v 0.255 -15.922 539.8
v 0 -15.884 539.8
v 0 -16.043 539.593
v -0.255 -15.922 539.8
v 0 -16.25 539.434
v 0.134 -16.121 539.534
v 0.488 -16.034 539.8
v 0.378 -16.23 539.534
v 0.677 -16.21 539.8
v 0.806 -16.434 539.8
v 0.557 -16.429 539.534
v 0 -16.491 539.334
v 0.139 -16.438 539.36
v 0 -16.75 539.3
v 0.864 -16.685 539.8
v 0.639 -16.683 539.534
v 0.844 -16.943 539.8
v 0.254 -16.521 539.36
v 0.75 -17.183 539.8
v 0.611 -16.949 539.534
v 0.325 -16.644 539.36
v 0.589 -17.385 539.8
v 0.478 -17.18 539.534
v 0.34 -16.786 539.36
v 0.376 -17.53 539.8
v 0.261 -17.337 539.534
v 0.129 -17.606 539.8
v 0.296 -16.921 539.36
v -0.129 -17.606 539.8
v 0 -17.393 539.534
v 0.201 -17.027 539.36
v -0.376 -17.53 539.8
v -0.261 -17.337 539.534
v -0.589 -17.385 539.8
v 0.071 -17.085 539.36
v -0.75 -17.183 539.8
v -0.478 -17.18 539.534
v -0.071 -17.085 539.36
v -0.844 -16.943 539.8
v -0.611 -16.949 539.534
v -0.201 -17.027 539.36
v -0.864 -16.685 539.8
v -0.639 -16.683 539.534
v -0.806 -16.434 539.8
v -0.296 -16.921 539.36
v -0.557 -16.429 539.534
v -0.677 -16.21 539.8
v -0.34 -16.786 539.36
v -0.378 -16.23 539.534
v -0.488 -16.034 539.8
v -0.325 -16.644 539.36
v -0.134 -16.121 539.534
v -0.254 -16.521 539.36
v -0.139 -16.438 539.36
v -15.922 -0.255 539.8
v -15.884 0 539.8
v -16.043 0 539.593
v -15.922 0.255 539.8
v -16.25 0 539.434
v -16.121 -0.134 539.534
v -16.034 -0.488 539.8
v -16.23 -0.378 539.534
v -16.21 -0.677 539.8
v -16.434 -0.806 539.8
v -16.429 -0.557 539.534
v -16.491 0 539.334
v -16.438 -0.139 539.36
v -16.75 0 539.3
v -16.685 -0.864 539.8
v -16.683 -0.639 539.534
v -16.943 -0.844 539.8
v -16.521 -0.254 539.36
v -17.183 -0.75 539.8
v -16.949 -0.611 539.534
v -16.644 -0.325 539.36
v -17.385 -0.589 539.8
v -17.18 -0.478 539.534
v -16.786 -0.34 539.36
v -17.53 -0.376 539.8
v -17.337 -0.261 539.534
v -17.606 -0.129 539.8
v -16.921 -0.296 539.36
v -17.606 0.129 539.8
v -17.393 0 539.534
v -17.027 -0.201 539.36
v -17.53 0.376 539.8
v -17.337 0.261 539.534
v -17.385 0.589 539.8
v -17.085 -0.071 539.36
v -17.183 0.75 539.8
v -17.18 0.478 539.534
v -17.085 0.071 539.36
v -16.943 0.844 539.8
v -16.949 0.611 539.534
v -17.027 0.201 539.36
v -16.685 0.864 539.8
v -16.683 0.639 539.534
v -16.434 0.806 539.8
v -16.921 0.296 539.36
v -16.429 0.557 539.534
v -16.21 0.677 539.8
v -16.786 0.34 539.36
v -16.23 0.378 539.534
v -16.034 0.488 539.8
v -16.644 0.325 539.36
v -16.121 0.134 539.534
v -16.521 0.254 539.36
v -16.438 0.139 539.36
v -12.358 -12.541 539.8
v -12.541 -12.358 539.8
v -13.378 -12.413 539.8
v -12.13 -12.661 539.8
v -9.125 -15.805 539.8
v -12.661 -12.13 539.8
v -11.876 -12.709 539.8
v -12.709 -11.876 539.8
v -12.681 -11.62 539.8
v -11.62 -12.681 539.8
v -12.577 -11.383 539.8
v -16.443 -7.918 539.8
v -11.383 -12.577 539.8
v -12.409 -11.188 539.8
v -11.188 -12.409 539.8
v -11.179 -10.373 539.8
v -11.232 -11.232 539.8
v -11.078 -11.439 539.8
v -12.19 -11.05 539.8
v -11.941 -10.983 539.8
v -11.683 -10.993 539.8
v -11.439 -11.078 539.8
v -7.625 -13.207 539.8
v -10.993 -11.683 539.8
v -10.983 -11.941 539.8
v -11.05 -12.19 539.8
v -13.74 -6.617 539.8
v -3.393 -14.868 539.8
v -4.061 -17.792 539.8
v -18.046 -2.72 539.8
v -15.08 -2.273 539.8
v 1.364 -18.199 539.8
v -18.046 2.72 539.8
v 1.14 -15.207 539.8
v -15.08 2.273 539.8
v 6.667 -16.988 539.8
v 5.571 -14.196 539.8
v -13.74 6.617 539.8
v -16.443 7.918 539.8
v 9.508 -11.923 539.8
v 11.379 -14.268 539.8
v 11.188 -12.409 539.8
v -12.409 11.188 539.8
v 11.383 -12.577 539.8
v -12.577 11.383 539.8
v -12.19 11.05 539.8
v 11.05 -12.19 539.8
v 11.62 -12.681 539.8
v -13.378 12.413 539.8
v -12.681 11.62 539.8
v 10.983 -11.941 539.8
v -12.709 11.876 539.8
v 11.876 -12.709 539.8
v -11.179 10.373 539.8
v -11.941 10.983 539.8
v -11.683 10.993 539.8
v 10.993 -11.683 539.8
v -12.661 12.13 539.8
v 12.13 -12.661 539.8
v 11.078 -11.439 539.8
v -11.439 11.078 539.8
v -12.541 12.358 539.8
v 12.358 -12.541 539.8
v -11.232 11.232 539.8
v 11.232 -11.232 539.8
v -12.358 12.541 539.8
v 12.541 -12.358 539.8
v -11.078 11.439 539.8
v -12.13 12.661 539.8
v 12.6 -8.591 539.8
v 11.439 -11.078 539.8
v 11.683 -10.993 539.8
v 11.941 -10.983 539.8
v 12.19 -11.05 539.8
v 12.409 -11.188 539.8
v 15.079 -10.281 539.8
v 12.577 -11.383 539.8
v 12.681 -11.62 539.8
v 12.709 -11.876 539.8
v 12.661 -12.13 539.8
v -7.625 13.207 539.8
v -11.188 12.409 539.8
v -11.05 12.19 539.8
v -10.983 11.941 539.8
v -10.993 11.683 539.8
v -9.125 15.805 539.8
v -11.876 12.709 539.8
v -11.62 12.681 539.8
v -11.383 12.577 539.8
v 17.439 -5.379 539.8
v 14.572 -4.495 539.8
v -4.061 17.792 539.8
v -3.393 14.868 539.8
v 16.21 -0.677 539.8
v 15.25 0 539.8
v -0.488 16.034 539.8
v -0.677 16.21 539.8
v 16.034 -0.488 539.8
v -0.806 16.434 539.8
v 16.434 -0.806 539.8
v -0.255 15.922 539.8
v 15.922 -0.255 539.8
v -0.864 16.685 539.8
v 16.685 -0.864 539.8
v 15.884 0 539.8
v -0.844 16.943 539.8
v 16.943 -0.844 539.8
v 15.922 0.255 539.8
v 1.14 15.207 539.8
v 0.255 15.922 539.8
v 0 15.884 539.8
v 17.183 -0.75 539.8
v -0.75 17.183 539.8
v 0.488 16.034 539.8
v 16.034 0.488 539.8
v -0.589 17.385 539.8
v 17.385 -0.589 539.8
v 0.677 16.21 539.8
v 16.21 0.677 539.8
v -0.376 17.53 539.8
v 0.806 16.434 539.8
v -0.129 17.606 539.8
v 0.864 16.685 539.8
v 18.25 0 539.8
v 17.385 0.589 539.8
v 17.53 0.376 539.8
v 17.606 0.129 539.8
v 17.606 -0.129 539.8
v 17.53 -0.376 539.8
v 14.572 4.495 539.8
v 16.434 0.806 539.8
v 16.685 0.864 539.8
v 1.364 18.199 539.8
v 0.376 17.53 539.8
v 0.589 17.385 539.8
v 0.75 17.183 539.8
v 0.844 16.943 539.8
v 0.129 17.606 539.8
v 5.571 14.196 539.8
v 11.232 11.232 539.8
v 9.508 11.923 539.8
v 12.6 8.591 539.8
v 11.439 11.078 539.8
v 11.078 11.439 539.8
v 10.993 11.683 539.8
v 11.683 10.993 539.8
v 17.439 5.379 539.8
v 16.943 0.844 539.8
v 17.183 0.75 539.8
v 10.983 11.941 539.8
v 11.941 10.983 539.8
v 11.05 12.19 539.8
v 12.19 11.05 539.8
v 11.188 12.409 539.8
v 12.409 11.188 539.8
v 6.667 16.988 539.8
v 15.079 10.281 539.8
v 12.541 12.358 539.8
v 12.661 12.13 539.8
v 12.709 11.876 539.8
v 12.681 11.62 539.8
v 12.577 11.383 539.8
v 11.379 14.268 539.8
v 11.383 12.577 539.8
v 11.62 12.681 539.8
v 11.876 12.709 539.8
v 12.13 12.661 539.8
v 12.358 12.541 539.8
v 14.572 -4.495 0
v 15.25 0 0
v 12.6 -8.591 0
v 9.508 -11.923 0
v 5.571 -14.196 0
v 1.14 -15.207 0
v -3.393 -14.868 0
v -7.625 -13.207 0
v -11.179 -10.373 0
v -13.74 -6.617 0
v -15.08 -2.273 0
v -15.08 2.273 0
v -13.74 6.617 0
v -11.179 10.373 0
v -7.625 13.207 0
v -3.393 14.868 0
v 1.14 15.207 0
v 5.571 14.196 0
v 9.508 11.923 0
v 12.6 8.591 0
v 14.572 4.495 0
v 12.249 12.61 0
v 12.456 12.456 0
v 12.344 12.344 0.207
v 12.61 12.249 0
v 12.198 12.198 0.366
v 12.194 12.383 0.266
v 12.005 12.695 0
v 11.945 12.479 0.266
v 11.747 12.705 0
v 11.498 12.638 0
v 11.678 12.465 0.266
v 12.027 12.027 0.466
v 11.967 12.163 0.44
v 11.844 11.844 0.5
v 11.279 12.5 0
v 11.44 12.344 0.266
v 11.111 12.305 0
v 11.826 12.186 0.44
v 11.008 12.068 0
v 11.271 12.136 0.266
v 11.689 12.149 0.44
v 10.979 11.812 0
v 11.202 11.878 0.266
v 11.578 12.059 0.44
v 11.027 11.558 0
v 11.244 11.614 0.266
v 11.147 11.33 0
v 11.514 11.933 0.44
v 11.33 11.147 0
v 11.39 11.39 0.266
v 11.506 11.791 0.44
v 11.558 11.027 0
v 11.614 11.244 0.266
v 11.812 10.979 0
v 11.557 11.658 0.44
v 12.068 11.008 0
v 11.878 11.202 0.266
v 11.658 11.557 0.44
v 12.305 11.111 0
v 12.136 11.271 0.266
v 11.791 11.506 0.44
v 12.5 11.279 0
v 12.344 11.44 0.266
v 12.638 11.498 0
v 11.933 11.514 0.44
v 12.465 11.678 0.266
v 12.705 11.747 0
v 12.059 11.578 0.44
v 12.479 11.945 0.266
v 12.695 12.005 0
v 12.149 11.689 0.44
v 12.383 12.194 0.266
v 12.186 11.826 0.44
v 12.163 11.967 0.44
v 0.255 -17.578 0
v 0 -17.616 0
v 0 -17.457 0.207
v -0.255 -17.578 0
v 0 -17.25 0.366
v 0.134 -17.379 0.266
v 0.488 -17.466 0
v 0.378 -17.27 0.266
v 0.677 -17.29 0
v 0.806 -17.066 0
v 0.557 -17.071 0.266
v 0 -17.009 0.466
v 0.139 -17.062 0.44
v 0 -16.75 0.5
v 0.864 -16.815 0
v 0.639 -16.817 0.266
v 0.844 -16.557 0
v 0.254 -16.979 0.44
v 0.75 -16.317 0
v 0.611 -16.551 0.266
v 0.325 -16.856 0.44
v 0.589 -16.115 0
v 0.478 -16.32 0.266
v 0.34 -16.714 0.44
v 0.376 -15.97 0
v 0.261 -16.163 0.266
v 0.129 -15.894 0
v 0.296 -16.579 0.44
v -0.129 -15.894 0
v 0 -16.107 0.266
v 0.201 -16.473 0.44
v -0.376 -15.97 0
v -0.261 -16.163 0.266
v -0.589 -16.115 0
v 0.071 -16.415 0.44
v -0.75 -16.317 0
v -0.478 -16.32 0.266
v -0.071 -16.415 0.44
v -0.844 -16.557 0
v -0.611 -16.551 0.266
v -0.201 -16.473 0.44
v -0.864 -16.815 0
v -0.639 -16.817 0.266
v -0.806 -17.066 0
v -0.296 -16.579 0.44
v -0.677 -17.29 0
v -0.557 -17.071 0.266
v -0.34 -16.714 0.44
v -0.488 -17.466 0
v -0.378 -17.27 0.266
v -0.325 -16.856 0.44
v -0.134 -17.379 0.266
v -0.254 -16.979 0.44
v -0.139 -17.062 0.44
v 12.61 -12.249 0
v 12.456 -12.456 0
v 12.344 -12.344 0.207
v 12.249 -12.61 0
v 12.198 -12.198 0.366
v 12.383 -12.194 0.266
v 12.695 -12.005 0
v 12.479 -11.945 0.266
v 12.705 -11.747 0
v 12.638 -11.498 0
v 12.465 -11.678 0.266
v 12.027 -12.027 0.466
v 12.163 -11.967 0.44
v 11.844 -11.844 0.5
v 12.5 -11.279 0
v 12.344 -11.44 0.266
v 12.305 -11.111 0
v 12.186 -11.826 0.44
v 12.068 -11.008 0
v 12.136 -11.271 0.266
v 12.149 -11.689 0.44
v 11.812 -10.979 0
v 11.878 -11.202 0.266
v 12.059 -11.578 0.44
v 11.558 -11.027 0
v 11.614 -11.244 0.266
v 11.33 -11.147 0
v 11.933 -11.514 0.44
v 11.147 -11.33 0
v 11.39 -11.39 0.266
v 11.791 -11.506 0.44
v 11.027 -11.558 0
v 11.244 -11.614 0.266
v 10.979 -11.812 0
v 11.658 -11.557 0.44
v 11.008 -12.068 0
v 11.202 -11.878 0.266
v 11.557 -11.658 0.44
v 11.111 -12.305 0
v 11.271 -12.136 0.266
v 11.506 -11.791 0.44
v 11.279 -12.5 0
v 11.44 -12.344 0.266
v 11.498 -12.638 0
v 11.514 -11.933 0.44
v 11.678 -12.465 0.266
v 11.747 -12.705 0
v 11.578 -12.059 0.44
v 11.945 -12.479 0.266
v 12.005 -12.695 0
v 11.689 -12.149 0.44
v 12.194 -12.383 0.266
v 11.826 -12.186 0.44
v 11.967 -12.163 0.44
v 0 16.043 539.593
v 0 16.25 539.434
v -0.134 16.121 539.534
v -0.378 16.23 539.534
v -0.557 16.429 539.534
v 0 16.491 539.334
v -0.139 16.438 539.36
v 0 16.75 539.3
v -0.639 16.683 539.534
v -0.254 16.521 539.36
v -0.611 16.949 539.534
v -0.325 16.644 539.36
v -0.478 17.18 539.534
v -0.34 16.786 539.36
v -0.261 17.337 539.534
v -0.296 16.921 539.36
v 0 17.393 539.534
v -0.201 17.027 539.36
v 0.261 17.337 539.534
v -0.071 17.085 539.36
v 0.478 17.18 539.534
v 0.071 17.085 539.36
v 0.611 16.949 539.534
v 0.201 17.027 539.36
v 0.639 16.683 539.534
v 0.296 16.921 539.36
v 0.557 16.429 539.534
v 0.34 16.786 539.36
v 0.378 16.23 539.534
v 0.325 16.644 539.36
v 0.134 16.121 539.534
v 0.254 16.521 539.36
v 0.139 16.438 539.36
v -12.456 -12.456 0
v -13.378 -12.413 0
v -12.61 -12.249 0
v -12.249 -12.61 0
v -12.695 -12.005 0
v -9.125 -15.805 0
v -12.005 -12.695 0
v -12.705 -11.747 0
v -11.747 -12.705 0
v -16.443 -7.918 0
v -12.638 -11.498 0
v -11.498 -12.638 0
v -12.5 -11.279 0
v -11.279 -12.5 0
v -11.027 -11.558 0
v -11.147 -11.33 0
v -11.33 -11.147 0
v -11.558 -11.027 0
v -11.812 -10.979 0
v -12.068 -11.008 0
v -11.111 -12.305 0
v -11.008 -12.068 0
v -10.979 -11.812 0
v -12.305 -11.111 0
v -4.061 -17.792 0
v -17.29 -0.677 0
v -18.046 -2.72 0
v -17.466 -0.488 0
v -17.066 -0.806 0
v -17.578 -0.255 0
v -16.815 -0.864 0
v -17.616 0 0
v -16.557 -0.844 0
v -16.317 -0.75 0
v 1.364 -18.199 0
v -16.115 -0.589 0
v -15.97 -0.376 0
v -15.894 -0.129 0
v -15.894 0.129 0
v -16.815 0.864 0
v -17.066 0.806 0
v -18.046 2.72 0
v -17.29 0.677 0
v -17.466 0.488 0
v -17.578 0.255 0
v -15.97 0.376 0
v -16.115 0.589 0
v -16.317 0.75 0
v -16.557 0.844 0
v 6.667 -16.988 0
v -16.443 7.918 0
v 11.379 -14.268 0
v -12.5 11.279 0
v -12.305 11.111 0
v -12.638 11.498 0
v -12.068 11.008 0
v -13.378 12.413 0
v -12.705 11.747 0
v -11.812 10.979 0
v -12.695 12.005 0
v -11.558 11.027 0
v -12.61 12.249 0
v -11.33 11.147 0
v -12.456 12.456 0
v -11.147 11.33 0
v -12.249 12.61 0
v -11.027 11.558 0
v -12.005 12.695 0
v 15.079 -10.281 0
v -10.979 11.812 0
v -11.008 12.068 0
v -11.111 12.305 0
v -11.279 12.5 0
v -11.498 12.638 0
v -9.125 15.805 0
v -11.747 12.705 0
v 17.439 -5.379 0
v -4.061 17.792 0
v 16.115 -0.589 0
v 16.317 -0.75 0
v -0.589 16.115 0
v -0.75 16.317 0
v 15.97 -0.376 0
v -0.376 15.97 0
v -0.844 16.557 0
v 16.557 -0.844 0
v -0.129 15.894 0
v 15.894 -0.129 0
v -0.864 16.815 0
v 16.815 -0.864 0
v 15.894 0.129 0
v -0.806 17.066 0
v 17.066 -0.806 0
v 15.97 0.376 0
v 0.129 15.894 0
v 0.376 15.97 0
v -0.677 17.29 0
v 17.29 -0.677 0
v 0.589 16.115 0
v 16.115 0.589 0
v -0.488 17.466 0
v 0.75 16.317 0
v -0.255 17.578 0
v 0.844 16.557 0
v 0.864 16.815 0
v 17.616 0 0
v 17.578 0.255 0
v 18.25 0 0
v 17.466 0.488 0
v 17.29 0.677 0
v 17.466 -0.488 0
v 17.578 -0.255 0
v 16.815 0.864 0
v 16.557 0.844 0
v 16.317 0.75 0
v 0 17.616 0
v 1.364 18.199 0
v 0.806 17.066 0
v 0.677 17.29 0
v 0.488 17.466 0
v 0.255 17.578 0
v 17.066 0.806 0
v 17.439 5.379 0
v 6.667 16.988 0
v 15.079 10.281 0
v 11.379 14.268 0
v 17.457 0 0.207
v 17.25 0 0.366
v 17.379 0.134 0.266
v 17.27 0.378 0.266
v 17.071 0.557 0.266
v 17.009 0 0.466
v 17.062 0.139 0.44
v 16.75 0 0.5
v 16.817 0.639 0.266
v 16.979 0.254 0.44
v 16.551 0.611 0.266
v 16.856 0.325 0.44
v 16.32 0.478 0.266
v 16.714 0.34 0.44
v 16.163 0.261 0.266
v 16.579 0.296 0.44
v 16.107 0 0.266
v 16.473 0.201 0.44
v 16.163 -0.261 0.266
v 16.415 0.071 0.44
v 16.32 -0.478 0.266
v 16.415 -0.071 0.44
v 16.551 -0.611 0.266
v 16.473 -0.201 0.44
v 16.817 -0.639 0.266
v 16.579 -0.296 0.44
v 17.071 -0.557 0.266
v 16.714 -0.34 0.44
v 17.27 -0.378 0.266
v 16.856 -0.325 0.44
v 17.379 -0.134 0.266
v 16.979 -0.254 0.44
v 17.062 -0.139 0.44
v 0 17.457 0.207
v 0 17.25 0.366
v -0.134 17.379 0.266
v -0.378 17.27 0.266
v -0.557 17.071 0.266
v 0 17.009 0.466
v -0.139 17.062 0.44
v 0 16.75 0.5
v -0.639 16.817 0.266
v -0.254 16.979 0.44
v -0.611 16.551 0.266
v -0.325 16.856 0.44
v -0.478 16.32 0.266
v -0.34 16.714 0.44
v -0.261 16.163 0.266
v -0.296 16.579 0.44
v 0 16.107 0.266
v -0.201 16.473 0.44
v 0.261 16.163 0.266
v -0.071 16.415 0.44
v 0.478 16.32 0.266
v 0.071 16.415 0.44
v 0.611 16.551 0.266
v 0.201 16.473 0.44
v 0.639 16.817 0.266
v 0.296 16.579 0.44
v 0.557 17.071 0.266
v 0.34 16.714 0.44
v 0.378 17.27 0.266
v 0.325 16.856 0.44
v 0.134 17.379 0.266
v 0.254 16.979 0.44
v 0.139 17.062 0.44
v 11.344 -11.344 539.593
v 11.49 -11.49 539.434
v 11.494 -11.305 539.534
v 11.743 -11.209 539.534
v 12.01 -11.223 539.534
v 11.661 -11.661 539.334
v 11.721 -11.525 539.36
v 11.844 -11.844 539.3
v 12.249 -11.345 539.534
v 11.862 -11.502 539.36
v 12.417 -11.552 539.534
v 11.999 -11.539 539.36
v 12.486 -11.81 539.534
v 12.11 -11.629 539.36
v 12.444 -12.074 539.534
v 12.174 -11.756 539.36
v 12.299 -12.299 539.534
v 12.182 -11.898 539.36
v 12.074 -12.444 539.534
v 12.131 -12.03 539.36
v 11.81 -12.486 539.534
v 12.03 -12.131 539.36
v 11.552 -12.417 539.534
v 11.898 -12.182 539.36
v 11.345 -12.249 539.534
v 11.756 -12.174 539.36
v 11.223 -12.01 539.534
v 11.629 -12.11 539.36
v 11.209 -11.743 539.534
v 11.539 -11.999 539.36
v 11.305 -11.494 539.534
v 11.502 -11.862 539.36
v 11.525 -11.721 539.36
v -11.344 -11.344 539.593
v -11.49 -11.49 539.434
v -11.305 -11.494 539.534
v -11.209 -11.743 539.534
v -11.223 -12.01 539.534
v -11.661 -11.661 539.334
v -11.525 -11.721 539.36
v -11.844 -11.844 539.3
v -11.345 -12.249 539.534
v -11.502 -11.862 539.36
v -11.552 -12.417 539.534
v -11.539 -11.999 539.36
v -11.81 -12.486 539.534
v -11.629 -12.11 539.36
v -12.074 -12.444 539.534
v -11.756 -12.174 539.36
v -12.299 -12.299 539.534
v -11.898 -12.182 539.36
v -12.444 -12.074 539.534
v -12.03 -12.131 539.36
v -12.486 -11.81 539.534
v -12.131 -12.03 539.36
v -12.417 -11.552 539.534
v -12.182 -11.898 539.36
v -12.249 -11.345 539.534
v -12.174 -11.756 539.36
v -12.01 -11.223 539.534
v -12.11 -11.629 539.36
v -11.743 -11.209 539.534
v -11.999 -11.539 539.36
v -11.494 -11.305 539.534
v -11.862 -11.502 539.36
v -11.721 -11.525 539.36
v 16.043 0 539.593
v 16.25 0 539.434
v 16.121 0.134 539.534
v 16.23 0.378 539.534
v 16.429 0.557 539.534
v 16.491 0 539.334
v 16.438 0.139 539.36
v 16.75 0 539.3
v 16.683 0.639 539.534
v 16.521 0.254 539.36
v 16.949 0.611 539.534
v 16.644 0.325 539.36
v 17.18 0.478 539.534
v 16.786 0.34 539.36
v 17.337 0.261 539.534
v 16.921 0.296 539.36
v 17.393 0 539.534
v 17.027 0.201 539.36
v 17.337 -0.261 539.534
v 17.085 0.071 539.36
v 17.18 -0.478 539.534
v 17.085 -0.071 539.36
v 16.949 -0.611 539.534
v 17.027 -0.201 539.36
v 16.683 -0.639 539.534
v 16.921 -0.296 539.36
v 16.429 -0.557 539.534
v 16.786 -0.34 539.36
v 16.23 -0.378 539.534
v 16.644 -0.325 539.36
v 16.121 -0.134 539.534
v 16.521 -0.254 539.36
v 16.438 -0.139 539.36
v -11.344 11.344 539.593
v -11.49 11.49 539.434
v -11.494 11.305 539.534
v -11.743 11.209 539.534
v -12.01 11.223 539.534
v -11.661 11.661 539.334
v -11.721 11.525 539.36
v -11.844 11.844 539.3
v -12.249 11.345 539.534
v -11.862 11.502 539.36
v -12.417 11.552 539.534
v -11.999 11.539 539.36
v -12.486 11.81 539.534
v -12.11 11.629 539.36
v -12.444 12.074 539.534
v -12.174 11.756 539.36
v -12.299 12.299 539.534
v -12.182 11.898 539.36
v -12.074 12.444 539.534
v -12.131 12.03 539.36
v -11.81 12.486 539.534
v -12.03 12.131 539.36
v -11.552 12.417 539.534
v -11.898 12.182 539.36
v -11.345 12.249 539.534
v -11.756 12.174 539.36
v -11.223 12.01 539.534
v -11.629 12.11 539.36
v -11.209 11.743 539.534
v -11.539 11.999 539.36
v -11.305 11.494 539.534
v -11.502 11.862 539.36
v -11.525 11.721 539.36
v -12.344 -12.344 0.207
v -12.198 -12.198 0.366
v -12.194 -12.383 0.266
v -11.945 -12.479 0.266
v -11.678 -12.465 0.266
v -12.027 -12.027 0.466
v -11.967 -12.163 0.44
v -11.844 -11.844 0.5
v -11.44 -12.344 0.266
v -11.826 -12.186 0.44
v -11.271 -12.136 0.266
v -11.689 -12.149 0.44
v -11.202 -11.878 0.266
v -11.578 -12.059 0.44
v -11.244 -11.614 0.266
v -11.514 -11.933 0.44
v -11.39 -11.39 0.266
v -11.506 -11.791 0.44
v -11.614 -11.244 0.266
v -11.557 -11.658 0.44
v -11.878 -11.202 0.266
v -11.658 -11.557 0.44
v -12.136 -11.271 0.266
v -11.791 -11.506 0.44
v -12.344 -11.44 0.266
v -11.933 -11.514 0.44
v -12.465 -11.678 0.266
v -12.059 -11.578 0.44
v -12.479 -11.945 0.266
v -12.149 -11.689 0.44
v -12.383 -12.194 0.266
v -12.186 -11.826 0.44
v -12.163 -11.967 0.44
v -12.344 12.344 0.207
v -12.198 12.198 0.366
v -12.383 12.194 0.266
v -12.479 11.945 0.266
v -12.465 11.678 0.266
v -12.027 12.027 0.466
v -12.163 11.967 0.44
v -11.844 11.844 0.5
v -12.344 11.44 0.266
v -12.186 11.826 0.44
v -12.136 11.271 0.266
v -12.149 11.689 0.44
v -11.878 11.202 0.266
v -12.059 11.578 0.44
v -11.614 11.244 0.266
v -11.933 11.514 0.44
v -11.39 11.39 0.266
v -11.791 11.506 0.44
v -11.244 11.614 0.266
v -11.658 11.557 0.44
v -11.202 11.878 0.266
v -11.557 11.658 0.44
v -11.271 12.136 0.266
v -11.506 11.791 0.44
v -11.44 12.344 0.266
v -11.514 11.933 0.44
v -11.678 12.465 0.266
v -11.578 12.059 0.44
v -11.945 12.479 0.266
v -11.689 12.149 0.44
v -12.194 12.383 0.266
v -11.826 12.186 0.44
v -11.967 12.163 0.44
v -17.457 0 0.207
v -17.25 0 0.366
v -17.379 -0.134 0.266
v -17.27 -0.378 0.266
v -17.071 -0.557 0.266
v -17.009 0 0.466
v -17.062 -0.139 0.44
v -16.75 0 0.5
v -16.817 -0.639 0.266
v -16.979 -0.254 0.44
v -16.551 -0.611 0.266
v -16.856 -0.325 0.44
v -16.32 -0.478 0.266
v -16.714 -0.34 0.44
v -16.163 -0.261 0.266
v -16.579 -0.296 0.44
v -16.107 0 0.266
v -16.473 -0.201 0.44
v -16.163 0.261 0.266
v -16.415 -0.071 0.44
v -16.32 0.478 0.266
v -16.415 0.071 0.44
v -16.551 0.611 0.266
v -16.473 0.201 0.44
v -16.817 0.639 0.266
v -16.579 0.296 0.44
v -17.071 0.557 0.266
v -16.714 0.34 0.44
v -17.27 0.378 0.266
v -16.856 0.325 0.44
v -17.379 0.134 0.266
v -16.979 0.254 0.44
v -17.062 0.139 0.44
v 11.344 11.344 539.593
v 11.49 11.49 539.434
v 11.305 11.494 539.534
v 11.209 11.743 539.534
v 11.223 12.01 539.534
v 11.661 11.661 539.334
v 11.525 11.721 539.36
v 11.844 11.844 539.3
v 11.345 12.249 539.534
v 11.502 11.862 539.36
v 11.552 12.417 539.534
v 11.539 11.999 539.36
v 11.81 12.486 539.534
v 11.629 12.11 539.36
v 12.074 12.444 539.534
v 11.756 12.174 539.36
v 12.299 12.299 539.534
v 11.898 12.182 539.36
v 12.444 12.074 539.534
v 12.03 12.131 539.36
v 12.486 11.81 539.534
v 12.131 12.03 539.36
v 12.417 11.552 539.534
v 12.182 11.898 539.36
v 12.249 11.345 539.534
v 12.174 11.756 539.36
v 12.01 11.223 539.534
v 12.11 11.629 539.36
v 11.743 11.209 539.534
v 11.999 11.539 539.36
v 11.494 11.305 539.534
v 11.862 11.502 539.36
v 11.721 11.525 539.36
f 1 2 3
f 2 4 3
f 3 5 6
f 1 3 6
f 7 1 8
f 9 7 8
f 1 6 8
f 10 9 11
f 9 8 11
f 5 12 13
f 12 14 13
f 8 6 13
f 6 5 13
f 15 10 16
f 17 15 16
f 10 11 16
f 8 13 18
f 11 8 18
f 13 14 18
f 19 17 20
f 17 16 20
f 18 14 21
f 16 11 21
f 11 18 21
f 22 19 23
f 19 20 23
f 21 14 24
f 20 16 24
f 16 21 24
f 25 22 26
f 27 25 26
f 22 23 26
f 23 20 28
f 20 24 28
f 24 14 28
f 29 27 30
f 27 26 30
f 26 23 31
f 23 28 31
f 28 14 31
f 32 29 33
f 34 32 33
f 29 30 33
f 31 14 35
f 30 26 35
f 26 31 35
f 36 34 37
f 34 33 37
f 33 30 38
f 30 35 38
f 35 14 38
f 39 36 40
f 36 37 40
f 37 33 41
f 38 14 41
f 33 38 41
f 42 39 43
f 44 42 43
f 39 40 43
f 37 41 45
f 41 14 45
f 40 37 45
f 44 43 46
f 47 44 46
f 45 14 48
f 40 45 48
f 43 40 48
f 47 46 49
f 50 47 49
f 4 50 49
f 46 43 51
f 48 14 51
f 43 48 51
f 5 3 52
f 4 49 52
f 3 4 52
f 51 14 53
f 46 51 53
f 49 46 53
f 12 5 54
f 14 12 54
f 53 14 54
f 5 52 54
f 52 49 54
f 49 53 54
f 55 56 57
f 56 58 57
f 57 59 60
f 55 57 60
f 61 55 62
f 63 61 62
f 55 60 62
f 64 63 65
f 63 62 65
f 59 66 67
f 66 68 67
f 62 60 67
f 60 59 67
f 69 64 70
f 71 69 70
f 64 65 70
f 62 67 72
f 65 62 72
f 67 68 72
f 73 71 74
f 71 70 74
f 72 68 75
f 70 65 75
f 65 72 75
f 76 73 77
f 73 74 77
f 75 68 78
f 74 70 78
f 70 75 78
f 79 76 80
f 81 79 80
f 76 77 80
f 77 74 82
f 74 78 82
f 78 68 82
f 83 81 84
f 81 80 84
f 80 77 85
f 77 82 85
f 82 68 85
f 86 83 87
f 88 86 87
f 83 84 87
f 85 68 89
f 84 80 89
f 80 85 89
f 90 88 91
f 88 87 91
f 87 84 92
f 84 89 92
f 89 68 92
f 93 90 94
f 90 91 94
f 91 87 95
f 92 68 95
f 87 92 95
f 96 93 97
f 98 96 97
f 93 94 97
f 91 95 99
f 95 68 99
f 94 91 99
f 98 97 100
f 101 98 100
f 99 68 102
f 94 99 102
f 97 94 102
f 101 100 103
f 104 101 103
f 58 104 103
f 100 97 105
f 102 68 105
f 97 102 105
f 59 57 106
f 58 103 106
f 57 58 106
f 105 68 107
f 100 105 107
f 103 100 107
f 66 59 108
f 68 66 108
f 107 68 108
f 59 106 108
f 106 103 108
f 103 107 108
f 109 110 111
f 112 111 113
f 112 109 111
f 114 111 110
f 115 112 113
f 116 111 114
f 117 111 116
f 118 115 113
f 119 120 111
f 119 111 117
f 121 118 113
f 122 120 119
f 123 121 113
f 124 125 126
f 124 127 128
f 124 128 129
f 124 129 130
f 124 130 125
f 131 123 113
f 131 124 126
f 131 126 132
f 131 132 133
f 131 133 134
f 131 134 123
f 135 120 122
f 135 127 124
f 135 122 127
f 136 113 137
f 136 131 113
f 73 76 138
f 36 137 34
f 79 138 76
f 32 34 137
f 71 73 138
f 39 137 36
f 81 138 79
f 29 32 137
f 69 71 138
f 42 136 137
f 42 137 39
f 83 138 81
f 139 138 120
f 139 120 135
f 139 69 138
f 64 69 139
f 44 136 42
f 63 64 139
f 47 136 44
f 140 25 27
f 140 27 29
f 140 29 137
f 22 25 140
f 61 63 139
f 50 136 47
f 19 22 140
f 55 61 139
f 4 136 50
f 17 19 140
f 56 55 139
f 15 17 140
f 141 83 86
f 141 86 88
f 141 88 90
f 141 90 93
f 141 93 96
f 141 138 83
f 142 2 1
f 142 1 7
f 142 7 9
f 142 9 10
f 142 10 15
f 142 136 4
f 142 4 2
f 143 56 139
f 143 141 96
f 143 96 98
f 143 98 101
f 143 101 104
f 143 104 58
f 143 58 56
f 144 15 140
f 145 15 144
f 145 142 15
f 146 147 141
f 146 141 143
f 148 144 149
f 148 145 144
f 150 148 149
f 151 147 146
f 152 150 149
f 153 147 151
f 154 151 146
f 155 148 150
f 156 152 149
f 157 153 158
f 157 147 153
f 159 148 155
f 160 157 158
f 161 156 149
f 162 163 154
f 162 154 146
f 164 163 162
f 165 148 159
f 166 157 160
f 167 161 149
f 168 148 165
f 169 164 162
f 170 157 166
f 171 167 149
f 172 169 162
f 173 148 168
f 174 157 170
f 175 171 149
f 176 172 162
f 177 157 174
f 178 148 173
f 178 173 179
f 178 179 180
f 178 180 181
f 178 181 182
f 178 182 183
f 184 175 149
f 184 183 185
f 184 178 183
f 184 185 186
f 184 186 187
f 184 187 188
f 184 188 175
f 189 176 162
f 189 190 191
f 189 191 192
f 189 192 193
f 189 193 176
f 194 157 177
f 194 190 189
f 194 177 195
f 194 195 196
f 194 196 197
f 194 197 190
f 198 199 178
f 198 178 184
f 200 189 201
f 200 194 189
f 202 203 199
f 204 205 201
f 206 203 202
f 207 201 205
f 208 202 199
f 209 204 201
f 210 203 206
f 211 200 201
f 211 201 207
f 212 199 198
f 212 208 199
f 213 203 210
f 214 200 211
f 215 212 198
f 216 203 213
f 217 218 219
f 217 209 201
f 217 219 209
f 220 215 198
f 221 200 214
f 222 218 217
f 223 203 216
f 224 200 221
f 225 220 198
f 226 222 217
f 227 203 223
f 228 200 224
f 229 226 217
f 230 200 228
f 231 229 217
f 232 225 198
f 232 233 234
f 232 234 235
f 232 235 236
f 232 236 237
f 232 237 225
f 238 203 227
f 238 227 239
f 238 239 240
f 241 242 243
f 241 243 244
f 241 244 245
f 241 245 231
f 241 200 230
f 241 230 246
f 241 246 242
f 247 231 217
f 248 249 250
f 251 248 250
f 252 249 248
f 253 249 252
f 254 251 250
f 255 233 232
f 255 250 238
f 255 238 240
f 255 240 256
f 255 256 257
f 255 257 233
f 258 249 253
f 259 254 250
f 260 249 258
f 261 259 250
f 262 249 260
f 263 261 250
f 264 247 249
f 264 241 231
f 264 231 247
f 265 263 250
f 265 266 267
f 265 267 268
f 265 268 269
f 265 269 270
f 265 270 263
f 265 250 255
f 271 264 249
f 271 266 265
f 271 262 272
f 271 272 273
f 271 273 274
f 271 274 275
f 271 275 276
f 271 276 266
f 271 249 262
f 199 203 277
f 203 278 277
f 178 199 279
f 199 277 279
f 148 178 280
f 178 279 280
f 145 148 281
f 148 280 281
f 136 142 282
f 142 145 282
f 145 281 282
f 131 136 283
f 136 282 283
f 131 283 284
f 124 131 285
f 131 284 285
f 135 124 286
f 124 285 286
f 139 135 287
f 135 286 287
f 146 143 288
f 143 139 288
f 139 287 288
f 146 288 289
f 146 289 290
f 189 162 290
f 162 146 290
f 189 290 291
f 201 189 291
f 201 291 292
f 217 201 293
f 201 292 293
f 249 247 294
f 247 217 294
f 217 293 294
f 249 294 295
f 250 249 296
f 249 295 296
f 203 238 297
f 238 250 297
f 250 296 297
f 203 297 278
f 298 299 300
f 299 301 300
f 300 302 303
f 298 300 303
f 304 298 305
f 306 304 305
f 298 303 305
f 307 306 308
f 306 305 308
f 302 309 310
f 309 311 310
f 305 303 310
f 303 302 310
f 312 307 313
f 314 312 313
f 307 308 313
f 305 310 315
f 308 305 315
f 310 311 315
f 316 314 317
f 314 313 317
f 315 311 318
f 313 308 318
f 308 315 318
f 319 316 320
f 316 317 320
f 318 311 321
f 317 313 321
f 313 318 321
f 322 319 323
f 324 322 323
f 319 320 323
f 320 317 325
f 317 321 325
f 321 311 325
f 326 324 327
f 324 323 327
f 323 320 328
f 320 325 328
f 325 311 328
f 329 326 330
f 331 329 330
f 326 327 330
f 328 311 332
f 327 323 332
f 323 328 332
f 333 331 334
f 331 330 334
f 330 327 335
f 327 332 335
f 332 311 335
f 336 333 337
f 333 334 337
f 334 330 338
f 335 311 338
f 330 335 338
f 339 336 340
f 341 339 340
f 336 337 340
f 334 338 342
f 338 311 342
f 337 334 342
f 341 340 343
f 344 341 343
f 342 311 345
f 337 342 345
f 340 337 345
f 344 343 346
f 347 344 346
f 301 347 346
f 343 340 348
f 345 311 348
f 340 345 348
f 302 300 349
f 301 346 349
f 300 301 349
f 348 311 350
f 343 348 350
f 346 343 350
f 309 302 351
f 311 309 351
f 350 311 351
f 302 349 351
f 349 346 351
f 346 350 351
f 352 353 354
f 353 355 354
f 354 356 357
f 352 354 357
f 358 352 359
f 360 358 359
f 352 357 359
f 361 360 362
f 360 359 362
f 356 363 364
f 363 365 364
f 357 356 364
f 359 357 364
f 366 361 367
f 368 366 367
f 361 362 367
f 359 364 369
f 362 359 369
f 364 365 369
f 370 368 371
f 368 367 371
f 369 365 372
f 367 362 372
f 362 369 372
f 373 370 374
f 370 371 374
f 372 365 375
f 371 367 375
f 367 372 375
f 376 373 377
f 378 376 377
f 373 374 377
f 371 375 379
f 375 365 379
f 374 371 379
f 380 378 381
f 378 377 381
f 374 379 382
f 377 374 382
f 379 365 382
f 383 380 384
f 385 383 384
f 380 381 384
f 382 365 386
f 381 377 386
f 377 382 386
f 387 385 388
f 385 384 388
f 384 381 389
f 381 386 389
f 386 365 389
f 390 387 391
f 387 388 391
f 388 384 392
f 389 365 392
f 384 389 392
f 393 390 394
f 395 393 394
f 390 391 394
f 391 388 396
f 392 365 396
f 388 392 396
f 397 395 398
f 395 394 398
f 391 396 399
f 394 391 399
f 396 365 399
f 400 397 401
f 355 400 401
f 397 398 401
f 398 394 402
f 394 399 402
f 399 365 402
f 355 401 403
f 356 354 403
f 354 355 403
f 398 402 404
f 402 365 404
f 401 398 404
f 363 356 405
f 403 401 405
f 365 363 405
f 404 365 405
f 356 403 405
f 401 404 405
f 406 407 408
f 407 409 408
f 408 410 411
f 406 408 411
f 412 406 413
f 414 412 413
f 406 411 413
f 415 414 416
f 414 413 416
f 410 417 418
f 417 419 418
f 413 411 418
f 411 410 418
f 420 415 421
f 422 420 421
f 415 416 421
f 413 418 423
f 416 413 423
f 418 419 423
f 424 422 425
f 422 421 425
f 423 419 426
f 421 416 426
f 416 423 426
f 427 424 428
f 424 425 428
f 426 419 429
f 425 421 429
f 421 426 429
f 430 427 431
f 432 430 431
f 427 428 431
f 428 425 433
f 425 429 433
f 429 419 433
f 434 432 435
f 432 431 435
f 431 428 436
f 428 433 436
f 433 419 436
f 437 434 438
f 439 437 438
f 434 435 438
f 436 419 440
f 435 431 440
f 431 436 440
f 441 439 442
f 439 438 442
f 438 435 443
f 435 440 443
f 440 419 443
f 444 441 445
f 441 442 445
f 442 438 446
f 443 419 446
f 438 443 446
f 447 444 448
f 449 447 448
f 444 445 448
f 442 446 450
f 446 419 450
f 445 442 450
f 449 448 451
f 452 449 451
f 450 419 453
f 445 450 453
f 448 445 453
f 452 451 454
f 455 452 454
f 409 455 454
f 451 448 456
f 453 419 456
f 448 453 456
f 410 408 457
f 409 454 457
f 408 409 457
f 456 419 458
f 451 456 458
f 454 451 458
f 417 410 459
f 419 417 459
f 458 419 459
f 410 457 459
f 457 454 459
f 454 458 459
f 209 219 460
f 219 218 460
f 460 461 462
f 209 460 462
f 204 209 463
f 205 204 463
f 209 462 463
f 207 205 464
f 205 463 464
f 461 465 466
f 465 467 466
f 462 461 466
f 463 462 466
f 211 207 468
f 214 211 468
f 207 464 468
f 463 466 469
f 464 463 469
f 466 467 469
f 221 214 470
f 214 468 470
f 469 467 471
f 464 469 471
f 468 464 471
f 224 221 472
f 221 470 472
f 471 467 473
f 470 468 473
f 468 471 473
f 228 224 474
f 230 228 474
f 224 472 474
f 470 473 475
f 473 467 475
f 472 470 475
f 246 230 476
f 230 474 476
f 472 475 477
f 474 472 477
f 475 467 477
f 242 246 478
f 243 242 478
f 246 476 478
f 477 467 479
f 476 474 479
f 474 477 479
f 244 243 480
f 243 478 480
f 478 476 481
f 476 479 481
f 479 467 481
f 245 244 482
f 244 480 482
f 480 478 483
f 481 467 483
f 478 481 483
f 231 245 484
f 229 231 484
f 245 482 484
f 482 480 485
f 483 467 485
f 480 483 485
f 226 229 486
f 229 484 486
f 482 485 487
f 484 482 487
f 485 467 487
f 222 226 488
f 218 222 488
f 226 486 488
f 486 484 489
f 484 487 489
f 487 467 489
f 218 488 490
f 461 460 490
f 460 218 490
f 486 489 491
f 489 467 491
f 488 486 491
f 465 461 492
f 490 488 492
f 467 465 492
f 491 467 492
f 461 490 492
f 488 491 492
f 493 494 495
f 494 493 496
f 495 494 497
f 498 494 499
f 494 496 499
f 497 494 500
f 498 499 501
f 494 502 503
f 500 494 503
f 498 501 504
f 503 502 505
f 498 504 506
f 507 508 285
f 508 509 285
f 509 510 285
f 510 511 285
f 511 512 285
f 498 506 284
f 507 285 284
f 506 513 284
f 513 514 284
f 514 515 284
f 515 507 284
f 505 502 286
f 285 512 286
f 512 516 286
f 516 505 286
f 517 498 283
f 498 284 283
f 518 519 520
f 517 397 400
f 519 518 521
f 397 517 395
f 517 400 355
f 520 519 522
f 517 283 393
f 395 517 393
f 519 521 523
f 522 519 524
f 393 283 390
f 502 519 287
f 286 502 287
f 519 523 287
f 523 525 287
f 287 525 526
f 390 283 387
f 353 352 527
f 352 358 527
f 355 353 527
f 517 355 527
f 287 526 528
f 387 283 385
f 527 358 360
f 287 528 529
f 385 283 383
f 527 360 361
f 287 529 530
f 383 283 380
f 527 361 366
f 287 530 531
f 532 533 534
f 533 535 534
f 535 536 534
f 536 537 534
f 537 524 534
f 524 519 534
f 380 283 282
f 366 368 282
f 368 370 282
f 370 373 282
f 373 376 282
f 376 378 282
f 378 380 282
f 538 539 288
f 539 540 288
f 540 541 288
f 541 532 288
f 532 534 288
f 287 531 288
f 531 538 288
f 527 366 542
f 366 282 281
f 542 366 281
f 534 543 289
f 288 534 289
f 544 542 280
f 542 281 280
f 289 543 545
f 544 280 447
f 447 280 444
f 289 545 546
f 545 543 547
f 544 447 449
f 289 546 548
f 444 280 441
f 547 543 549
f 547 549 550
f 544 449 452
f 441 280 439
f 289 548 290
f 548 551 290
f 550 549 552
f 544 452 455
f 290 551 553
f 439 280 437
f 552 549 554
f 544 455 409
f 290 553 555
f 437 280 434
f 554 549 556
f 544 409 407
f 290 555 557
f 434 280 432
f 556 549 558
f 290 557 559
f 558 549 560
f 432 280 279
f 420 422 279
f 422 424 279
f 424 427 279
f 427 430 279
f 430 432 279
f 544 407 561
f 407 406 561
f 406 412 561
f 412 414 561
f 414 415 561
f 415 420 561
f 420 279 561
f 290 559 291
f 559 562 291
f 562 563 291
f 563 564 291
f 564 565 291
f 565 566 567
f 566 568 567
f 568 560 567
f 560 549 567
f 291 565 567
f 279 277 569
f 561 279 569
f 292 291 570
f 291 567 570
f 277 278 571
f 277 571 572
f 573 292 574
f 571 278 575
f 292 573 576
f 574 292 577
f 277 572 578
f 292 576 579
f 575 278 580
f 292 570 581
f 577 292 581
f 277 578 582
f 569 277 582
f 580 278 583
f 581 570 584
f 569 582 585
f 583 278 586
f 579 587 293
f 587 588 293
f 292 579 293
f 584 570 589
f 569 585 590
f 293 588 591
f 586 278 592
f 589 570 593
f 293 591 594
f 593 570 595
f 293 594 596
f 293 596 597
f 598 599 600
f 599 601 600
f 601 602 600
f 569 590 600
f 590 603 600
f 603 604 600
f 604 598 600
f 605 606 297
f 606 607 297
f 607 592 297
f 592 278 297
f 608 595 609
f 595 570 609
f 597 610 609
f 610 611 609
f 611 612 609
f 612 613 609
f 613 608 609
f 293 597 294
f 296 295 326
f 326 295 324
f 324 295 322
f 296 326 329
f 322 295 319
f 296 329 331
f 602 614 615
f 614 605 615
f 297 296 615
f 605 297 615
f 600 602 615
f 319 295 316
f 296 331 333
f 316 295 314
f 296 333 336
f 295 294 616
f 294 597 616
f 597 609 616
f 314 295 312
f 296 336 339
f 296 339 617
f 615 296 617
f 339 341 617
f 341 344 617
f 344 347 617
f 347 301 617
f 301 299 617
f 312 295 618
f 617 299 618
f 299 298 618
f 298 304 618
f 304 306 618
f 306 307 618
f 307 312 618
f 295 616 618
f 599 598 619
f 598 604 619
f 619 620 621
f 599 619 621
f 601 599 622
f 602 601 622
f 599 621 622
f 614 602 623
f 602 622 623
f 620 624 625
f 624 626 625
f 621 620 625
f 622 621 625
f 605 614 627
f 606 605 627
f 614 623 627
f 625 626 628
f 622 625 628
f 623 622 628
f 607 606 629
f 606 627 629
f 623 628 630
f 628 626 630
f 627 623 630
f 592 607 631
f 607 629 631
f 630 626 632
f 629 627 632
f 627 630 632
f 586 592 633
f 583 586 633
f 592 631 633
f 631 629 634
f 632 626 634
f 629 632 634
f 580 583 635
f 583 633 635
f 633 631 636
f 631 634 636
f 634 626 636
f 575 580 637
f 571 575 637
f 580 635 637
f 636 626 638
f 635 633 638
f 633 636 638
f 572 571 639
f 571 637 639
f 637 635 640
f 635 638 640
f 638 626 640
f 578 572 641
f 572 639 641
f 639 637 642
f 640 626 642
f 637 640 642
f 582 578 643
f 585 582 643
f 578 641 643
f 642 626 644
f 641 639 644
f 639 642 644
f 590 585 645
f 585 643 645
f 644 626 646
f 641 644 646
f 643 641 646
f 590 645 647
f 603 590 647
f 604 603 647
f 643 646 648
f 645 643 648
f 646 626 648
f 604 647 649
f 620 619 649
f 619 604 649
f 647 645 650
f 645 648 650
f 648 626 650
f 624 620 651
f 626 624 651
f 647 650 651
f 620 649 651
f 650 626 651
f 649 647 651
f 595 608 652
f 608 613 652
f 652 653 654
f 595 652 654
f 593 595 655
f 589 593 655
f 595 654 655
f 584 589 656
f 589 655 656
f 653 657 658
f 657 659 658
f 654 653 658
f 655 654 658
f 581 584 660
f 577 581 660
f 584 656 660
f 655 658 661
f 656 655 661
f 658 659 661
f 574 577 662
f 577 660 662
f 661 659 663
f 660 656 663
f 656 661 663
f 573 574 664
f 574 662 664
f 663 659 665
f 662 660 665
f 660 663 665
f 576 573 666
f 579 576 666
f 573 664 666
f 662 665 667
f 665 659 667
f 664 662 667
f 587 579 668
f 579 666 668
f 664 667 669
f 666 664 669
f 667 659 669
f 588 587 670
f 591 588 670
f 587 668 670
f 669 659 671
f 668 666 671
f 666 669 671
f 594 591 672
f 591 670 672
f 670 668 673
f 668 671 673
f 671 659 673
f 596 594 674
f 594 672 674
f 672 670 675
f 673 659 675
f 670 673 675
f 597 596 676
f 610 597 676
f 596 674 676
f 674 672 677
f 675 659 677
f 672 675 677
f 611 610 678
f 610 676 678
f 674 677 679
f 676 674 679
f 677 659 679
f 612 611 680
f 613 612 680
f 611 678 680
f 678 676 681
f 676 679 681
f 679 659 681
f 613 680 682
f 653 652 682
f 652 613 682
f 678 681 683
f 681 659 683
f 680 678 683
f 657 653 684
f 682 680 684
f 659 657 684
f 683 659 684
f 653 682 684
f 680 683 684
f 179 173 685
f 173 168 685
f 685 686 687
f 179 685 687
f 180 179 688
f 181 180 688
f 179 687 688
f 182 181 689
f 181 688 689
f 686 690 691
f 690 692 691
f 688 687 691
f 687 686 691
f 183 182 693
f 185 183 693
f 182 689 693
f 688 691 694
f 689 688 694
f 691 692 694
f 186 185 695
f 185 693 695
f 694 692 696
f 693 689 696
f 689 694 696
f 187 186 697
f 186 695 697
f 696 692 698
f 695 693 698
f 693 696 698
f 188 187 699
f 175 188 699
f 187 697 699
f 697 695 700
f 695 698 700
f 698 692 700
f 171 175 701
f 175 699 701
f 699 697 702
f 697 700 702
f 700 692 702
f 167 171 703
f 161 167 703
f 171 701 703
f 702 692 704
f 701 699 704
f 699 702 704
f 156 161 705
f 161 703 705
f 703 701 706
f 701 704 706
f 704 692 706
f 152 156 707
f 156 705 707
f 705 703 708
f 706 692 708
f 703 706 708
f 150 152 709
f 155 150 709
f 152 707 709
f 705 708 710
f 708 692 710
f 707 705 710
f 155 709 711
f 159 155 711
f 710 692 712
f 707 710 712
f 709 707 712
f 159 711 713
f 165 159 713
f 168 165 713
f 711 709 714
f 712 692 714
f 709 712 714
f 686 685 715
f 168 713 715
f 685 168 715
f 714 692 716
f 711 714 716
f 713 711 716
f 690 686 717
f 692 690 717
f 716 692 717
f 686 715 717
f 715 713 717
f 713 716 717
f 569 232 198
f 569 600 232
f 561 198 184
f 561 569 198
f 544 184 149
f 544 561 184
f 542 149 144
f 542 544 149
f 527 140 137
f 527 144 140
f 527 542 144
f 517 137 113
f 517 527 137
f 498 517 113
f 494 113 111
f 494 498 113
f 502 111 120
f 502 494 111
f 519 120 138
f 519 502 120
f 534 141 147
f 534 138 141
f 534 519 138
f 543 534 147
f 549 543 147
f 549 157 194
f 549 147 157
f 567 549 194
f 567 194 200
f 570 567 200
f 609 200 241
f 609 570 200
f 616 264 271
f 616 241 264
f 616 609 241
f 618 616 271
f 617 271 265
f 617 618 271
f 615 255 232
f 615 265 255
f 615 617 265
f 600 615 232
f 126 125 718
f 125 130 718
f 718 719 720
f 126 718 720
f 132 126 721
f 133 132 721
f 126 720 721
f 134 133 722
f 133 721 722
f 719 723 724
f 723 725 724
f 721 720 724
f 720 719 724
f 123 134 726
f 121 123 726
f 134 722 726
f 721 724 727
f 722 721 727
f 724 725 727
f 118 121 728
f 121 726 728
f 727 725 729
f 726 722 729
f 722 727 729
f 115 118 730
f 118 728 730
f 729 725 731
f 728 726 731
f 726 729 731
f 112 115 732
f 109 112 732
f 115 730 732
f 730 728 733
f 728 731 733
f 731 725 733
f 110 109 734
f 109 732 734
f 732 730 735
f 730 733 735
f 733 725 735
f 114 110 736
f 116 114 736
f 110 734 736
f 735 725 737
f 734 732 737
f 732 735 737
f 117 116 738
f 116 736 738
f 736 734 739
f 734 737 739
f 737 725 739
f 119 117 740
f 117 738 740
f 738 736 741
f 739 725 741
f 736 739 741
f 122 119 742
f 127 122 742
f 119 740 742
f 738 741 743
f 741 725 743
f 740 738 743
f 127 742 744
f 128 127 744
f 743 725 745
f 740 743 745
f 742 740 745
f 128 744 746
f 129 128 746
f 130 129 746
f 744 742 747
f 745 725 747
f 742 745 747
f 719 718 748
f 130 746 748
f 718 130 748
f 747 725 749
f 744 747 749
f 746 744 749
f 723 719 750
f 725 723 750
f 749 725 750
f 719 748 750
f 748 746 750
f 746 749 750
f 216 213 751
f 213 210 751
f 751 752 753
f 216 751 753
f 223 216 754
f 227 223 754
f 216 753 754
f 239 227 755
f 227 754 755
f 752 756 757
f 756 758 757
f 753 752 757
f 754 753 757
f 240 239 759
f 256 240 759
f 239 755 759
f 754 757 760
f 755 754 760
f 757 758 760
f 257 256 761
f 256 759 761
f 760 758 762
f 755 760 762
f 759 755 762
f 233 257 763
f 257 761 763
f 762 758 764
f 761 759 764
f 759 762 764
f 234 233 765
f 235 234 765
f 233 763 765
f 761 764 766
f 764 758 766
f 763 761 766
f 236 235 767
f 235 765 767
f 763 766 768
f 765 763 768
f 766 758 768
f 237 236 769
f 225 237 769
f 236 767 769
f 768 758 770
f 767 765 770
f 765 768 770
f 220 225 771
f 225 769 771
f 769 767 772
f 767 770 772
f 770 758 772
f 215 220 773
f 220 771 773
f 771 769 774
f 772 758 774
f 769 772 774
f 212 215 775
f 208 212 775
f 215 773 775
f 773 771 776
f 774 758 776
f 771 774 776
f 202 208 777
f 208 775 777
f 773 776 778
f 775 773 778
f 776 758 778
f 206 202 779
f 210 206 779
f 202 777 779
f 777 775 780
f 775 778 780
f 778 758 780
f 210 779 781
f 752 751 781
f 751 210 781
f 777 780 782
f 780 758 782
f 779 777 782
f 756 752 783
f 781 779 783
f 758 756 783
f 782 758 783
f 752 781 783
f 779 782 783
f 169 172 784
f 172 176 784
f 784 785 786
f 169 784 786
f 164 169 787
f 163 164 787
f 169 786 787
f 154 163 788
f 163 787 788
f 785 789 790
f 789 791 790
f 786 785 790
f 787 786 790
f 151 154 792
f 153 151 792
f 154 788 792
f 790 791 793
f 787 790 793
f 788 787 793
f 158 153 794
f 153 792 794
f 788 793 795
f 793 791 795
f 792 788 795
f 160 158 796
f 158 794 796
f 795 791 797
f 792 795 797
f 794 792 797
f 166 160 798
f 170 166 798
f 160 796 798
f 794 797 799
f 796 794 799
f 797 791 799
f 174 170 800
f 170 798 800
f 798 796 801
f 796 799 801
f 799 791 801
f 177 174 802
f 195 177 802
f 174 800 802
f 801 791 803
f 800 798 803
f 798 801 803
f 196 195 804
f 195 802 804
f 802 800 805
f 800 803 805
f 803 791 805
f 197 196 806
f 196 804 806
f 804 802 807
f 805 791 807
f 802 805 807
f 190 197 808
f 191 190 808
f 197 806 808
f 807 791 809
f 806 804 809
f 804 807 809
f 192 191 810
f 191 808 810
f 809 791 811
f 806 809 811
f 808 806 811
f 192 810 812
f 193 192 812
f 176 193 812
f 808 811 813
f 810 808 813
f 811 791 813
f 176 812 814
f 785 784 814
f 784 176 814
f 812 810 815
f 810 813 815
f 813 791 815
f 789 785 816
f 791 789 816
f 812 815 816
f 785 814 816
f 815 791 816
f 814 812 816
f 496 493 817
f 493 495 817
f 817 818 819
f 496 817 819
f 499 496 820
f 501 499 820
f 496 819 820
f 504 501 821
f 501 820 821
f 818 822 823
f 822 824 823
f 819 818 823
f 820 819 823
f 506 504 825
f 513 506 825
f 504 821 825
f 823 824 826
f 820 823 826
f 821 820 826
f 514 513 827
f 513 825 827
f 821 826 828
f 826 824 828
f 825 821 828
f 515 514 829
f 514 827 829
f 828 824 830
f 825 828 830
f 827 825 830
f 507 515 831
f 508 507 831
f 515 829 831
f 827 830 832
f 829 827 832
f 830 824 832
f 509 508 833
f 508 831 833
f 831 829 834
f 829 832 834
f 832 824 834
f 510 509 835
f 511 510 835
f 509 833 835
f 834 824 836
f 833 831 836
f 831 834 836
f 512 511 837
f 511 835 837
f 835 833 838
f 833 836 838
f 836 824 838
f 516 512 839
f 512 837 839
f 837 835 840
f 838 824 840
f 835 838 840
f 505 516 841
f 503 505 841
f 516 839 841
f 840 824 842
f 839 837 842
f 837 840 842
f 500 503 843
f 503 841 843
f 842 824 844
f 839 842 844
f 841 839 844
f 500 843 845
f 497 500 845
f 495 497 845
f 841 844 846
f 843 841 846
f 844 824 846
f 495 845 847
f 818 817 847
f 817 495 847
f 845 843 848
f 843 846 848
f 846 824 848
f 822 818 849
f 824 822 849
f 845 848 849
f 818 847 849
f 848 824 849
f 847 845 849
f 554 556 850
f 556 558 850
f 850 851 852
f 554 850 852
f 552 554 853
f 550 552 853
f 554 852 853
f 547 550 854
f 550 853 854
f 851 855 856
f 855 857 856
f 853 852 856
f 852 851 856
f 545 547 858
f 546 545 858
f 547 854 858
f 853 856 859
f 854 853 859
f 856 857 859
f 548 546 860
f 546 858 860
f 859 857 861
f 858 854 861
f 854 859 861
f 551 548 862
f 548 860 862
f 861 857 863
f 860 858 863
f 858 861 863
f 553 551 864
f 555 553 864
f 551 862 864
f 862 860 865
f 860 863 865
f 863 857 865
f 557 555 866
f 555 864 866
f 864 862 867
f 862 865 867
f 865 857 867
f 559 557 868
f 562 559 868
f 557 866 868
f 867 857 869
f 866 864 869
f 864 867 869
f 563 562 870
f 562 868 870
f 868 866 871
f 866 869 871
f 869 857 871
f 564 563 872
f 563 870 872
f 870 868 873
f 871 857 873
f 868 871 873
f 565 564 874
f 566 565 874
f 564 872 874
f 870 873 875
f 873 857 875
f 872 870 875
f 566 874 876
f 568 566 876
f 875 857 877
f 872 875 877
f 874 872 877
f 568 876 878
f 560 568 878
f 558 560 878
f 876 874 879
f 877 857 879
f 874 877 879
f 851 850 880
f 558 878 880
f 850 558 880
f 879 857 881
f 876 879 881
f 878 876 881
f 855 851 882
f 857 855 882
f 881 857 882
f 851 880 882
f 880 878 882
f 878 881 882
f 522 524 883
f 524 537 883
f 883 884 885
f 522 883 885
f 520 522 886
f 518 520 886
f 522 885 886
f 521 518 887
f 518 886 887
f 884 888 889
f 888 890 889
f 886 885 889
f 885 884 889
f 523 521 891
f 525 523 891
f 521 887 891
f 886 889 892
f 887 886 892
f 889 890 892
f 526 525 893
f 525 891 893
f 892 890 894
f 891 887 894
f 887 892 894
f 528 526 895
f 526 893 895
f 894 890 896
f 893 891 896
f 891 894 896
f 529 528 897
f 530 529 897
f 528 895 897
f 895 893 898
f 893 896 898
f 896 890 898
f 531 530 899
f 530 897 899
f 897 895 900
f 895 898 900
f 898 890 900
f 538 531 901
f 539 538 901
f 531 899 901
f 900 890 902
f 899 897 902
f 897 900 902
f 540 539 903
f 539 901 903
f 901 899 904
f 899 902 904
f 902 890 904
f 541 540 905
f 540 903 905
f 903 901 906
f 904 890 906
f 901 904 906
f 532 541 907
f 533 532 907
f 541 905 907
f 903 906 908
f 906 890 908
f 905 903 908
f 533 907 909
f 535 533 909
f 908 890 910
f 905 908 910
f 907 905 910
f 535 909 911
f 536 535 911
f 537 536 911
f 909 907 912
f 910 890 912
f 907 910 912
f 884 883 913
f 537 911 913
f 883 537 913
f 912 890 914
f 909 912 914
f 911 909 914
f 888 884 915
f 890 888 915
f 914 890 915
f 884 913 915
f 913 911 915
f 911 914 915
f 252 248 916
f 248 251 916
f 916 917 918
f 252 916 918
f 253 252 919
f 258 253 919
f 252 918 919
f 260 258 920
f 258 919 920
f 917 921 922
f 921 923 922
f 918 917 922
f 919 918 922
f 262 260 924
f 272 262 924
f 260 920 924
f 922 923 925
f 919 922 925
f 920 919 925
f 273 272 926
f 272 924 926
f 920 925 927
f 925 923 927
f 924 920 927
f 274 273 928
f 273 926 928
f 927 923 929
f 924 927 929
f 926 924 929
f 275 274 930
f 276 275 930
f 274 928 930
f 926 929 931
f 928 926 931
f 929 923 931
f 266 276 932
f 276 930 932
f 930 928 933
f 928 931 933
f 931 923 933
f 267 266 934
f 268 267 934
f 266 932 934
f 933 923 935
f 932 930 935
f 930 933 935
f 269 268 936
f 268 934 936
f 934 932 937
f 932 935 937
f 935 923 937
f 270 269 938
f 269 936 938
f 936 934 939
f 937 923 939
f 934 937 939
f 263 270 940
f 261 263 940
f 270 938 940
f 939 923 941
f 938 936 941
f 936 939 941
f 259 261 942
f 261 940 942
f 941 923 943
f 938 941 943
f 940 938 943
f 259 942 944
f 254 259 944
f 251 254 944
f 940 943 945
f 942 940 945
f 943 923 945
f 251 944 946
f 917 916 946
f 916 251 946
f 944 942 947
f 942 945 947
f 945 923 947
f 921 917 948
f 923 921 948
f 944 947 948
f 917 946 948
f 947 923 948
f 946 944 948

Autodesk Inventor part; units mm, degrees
ref_plane "YZ Plane" through (0, 0, 0) normal (1, 0, 0) x (0, 1, 0)
ref_plane "XZ Plane" through (0, 0, 0) normal (0, 1, 0) x (-1, 0, 0)
ref_plane "XY Plane" through (0, 0, 0) normal (0, 0, 1) x (1, 0, 0)
sketch "Sketch1" plane through (0, 0, 0) normal (0, 0, 1) x (1, 0, 0)
  circle A0 centre (0, 0) radius 15.25
  circle A1 centre (0, 0) radius 18.25
  dimension "d0" = 30.5
  dimension "d1" = 36.5
extrude "Extrusion1" add sketch "Sketch1" along normal blind 539.8
sketch "Sketch2" plane through (0, 0, 0) normal (0, 1, 0) x (-1, 0, 0)
  line L0 (18.25, 0) -> (18.25, 539.8) projected
  line L1 (15.25, 0) -> (15.25, 539.8) projected
  line L2 (-18.25, 539.8) -> (18.25, 539.8) projected
  line L3 (-18.25, 0) -> (18.25, 0) projected
  line L4 (16.75, 539.8) -> (16.75, 484.0456)
  line L5 (16.75, 527.9588) -> (15.25, 527.9588)
  line L6 (16.75, 525.4794) -> (18.25, 525.4794)
  line L7 (16.75, 539.8) -> (16.75, 545.2687)
  circle A0 centre (16.75, 540.3) radius 1
  line L8 (16.75, 539.8) -> (16.75, 539.3)
  line L9 (16.75, 539.8) -> (15.884, 539.8)
  arc A1 (15.884, 539.8) -> (16.75, 539.3) centre (16.75, 540.3) ccw
  dimension "d4" = 2
  dimension "d5" = 0.5
revolve "Revolution1" cut sketch "Sketch2" angle 360 about axis through (-16.75, 0, 539.8) along (0, 0, -1) picked at (16.2136, 539.7436) contours L4 A0 L2
pattern_circular "Circular Pattern2" count 8 over 360 about axis through (0, 0, 0) along (0, 0, 1) of "Revolution1"
sketch "Sketch3" plane through (0, 0, 0) normal (0, 1, 0) x (-1, 0, 0)
  line L0 (18.25, 0) -> (18.25, 539.8) projected
  line L1 (15.25, 0) -> (15.25, 539.8) projected
  line L2 (-18.25, 0) -> (18.25, 0) projected
  line L3 (16.75, 0) -> (16.75, 57.9102)
  line L4 (16.75, 9.1086) -> (15.25, 9.1086)
  line L5 (16.75, 7.2128) -> (18.25, 7.2128)
  line L6 (16.75, 0) -> (16.75, -10.4)
  circle A0 centre (16.75, -0.5) radius 1
  line L7 (16.75, 0.5) -> (16.75, 0)
  line L8 (16.75, 0) -> (17.616, 0)
  arc A1 (17.616, 0) -> (16.75, 0.5) centre (16.75, -0.5) ccw
  dimension "d13" = 2
  dimension "d14" = 0.5
revolve "Revolution2" cut sketch "Sketch3" angle 360 about axis through (-16.75, 0, 0) along (0, 0, 1) picked at (17.2864, 0.0564) contours L2 L3 A0
pattern_circular "Circular Pattern3" count 8 over 360 about axis through (0, 0, 0) along (0, 0, 1) of "Revolution2"
properties part number "Electrode 3"
